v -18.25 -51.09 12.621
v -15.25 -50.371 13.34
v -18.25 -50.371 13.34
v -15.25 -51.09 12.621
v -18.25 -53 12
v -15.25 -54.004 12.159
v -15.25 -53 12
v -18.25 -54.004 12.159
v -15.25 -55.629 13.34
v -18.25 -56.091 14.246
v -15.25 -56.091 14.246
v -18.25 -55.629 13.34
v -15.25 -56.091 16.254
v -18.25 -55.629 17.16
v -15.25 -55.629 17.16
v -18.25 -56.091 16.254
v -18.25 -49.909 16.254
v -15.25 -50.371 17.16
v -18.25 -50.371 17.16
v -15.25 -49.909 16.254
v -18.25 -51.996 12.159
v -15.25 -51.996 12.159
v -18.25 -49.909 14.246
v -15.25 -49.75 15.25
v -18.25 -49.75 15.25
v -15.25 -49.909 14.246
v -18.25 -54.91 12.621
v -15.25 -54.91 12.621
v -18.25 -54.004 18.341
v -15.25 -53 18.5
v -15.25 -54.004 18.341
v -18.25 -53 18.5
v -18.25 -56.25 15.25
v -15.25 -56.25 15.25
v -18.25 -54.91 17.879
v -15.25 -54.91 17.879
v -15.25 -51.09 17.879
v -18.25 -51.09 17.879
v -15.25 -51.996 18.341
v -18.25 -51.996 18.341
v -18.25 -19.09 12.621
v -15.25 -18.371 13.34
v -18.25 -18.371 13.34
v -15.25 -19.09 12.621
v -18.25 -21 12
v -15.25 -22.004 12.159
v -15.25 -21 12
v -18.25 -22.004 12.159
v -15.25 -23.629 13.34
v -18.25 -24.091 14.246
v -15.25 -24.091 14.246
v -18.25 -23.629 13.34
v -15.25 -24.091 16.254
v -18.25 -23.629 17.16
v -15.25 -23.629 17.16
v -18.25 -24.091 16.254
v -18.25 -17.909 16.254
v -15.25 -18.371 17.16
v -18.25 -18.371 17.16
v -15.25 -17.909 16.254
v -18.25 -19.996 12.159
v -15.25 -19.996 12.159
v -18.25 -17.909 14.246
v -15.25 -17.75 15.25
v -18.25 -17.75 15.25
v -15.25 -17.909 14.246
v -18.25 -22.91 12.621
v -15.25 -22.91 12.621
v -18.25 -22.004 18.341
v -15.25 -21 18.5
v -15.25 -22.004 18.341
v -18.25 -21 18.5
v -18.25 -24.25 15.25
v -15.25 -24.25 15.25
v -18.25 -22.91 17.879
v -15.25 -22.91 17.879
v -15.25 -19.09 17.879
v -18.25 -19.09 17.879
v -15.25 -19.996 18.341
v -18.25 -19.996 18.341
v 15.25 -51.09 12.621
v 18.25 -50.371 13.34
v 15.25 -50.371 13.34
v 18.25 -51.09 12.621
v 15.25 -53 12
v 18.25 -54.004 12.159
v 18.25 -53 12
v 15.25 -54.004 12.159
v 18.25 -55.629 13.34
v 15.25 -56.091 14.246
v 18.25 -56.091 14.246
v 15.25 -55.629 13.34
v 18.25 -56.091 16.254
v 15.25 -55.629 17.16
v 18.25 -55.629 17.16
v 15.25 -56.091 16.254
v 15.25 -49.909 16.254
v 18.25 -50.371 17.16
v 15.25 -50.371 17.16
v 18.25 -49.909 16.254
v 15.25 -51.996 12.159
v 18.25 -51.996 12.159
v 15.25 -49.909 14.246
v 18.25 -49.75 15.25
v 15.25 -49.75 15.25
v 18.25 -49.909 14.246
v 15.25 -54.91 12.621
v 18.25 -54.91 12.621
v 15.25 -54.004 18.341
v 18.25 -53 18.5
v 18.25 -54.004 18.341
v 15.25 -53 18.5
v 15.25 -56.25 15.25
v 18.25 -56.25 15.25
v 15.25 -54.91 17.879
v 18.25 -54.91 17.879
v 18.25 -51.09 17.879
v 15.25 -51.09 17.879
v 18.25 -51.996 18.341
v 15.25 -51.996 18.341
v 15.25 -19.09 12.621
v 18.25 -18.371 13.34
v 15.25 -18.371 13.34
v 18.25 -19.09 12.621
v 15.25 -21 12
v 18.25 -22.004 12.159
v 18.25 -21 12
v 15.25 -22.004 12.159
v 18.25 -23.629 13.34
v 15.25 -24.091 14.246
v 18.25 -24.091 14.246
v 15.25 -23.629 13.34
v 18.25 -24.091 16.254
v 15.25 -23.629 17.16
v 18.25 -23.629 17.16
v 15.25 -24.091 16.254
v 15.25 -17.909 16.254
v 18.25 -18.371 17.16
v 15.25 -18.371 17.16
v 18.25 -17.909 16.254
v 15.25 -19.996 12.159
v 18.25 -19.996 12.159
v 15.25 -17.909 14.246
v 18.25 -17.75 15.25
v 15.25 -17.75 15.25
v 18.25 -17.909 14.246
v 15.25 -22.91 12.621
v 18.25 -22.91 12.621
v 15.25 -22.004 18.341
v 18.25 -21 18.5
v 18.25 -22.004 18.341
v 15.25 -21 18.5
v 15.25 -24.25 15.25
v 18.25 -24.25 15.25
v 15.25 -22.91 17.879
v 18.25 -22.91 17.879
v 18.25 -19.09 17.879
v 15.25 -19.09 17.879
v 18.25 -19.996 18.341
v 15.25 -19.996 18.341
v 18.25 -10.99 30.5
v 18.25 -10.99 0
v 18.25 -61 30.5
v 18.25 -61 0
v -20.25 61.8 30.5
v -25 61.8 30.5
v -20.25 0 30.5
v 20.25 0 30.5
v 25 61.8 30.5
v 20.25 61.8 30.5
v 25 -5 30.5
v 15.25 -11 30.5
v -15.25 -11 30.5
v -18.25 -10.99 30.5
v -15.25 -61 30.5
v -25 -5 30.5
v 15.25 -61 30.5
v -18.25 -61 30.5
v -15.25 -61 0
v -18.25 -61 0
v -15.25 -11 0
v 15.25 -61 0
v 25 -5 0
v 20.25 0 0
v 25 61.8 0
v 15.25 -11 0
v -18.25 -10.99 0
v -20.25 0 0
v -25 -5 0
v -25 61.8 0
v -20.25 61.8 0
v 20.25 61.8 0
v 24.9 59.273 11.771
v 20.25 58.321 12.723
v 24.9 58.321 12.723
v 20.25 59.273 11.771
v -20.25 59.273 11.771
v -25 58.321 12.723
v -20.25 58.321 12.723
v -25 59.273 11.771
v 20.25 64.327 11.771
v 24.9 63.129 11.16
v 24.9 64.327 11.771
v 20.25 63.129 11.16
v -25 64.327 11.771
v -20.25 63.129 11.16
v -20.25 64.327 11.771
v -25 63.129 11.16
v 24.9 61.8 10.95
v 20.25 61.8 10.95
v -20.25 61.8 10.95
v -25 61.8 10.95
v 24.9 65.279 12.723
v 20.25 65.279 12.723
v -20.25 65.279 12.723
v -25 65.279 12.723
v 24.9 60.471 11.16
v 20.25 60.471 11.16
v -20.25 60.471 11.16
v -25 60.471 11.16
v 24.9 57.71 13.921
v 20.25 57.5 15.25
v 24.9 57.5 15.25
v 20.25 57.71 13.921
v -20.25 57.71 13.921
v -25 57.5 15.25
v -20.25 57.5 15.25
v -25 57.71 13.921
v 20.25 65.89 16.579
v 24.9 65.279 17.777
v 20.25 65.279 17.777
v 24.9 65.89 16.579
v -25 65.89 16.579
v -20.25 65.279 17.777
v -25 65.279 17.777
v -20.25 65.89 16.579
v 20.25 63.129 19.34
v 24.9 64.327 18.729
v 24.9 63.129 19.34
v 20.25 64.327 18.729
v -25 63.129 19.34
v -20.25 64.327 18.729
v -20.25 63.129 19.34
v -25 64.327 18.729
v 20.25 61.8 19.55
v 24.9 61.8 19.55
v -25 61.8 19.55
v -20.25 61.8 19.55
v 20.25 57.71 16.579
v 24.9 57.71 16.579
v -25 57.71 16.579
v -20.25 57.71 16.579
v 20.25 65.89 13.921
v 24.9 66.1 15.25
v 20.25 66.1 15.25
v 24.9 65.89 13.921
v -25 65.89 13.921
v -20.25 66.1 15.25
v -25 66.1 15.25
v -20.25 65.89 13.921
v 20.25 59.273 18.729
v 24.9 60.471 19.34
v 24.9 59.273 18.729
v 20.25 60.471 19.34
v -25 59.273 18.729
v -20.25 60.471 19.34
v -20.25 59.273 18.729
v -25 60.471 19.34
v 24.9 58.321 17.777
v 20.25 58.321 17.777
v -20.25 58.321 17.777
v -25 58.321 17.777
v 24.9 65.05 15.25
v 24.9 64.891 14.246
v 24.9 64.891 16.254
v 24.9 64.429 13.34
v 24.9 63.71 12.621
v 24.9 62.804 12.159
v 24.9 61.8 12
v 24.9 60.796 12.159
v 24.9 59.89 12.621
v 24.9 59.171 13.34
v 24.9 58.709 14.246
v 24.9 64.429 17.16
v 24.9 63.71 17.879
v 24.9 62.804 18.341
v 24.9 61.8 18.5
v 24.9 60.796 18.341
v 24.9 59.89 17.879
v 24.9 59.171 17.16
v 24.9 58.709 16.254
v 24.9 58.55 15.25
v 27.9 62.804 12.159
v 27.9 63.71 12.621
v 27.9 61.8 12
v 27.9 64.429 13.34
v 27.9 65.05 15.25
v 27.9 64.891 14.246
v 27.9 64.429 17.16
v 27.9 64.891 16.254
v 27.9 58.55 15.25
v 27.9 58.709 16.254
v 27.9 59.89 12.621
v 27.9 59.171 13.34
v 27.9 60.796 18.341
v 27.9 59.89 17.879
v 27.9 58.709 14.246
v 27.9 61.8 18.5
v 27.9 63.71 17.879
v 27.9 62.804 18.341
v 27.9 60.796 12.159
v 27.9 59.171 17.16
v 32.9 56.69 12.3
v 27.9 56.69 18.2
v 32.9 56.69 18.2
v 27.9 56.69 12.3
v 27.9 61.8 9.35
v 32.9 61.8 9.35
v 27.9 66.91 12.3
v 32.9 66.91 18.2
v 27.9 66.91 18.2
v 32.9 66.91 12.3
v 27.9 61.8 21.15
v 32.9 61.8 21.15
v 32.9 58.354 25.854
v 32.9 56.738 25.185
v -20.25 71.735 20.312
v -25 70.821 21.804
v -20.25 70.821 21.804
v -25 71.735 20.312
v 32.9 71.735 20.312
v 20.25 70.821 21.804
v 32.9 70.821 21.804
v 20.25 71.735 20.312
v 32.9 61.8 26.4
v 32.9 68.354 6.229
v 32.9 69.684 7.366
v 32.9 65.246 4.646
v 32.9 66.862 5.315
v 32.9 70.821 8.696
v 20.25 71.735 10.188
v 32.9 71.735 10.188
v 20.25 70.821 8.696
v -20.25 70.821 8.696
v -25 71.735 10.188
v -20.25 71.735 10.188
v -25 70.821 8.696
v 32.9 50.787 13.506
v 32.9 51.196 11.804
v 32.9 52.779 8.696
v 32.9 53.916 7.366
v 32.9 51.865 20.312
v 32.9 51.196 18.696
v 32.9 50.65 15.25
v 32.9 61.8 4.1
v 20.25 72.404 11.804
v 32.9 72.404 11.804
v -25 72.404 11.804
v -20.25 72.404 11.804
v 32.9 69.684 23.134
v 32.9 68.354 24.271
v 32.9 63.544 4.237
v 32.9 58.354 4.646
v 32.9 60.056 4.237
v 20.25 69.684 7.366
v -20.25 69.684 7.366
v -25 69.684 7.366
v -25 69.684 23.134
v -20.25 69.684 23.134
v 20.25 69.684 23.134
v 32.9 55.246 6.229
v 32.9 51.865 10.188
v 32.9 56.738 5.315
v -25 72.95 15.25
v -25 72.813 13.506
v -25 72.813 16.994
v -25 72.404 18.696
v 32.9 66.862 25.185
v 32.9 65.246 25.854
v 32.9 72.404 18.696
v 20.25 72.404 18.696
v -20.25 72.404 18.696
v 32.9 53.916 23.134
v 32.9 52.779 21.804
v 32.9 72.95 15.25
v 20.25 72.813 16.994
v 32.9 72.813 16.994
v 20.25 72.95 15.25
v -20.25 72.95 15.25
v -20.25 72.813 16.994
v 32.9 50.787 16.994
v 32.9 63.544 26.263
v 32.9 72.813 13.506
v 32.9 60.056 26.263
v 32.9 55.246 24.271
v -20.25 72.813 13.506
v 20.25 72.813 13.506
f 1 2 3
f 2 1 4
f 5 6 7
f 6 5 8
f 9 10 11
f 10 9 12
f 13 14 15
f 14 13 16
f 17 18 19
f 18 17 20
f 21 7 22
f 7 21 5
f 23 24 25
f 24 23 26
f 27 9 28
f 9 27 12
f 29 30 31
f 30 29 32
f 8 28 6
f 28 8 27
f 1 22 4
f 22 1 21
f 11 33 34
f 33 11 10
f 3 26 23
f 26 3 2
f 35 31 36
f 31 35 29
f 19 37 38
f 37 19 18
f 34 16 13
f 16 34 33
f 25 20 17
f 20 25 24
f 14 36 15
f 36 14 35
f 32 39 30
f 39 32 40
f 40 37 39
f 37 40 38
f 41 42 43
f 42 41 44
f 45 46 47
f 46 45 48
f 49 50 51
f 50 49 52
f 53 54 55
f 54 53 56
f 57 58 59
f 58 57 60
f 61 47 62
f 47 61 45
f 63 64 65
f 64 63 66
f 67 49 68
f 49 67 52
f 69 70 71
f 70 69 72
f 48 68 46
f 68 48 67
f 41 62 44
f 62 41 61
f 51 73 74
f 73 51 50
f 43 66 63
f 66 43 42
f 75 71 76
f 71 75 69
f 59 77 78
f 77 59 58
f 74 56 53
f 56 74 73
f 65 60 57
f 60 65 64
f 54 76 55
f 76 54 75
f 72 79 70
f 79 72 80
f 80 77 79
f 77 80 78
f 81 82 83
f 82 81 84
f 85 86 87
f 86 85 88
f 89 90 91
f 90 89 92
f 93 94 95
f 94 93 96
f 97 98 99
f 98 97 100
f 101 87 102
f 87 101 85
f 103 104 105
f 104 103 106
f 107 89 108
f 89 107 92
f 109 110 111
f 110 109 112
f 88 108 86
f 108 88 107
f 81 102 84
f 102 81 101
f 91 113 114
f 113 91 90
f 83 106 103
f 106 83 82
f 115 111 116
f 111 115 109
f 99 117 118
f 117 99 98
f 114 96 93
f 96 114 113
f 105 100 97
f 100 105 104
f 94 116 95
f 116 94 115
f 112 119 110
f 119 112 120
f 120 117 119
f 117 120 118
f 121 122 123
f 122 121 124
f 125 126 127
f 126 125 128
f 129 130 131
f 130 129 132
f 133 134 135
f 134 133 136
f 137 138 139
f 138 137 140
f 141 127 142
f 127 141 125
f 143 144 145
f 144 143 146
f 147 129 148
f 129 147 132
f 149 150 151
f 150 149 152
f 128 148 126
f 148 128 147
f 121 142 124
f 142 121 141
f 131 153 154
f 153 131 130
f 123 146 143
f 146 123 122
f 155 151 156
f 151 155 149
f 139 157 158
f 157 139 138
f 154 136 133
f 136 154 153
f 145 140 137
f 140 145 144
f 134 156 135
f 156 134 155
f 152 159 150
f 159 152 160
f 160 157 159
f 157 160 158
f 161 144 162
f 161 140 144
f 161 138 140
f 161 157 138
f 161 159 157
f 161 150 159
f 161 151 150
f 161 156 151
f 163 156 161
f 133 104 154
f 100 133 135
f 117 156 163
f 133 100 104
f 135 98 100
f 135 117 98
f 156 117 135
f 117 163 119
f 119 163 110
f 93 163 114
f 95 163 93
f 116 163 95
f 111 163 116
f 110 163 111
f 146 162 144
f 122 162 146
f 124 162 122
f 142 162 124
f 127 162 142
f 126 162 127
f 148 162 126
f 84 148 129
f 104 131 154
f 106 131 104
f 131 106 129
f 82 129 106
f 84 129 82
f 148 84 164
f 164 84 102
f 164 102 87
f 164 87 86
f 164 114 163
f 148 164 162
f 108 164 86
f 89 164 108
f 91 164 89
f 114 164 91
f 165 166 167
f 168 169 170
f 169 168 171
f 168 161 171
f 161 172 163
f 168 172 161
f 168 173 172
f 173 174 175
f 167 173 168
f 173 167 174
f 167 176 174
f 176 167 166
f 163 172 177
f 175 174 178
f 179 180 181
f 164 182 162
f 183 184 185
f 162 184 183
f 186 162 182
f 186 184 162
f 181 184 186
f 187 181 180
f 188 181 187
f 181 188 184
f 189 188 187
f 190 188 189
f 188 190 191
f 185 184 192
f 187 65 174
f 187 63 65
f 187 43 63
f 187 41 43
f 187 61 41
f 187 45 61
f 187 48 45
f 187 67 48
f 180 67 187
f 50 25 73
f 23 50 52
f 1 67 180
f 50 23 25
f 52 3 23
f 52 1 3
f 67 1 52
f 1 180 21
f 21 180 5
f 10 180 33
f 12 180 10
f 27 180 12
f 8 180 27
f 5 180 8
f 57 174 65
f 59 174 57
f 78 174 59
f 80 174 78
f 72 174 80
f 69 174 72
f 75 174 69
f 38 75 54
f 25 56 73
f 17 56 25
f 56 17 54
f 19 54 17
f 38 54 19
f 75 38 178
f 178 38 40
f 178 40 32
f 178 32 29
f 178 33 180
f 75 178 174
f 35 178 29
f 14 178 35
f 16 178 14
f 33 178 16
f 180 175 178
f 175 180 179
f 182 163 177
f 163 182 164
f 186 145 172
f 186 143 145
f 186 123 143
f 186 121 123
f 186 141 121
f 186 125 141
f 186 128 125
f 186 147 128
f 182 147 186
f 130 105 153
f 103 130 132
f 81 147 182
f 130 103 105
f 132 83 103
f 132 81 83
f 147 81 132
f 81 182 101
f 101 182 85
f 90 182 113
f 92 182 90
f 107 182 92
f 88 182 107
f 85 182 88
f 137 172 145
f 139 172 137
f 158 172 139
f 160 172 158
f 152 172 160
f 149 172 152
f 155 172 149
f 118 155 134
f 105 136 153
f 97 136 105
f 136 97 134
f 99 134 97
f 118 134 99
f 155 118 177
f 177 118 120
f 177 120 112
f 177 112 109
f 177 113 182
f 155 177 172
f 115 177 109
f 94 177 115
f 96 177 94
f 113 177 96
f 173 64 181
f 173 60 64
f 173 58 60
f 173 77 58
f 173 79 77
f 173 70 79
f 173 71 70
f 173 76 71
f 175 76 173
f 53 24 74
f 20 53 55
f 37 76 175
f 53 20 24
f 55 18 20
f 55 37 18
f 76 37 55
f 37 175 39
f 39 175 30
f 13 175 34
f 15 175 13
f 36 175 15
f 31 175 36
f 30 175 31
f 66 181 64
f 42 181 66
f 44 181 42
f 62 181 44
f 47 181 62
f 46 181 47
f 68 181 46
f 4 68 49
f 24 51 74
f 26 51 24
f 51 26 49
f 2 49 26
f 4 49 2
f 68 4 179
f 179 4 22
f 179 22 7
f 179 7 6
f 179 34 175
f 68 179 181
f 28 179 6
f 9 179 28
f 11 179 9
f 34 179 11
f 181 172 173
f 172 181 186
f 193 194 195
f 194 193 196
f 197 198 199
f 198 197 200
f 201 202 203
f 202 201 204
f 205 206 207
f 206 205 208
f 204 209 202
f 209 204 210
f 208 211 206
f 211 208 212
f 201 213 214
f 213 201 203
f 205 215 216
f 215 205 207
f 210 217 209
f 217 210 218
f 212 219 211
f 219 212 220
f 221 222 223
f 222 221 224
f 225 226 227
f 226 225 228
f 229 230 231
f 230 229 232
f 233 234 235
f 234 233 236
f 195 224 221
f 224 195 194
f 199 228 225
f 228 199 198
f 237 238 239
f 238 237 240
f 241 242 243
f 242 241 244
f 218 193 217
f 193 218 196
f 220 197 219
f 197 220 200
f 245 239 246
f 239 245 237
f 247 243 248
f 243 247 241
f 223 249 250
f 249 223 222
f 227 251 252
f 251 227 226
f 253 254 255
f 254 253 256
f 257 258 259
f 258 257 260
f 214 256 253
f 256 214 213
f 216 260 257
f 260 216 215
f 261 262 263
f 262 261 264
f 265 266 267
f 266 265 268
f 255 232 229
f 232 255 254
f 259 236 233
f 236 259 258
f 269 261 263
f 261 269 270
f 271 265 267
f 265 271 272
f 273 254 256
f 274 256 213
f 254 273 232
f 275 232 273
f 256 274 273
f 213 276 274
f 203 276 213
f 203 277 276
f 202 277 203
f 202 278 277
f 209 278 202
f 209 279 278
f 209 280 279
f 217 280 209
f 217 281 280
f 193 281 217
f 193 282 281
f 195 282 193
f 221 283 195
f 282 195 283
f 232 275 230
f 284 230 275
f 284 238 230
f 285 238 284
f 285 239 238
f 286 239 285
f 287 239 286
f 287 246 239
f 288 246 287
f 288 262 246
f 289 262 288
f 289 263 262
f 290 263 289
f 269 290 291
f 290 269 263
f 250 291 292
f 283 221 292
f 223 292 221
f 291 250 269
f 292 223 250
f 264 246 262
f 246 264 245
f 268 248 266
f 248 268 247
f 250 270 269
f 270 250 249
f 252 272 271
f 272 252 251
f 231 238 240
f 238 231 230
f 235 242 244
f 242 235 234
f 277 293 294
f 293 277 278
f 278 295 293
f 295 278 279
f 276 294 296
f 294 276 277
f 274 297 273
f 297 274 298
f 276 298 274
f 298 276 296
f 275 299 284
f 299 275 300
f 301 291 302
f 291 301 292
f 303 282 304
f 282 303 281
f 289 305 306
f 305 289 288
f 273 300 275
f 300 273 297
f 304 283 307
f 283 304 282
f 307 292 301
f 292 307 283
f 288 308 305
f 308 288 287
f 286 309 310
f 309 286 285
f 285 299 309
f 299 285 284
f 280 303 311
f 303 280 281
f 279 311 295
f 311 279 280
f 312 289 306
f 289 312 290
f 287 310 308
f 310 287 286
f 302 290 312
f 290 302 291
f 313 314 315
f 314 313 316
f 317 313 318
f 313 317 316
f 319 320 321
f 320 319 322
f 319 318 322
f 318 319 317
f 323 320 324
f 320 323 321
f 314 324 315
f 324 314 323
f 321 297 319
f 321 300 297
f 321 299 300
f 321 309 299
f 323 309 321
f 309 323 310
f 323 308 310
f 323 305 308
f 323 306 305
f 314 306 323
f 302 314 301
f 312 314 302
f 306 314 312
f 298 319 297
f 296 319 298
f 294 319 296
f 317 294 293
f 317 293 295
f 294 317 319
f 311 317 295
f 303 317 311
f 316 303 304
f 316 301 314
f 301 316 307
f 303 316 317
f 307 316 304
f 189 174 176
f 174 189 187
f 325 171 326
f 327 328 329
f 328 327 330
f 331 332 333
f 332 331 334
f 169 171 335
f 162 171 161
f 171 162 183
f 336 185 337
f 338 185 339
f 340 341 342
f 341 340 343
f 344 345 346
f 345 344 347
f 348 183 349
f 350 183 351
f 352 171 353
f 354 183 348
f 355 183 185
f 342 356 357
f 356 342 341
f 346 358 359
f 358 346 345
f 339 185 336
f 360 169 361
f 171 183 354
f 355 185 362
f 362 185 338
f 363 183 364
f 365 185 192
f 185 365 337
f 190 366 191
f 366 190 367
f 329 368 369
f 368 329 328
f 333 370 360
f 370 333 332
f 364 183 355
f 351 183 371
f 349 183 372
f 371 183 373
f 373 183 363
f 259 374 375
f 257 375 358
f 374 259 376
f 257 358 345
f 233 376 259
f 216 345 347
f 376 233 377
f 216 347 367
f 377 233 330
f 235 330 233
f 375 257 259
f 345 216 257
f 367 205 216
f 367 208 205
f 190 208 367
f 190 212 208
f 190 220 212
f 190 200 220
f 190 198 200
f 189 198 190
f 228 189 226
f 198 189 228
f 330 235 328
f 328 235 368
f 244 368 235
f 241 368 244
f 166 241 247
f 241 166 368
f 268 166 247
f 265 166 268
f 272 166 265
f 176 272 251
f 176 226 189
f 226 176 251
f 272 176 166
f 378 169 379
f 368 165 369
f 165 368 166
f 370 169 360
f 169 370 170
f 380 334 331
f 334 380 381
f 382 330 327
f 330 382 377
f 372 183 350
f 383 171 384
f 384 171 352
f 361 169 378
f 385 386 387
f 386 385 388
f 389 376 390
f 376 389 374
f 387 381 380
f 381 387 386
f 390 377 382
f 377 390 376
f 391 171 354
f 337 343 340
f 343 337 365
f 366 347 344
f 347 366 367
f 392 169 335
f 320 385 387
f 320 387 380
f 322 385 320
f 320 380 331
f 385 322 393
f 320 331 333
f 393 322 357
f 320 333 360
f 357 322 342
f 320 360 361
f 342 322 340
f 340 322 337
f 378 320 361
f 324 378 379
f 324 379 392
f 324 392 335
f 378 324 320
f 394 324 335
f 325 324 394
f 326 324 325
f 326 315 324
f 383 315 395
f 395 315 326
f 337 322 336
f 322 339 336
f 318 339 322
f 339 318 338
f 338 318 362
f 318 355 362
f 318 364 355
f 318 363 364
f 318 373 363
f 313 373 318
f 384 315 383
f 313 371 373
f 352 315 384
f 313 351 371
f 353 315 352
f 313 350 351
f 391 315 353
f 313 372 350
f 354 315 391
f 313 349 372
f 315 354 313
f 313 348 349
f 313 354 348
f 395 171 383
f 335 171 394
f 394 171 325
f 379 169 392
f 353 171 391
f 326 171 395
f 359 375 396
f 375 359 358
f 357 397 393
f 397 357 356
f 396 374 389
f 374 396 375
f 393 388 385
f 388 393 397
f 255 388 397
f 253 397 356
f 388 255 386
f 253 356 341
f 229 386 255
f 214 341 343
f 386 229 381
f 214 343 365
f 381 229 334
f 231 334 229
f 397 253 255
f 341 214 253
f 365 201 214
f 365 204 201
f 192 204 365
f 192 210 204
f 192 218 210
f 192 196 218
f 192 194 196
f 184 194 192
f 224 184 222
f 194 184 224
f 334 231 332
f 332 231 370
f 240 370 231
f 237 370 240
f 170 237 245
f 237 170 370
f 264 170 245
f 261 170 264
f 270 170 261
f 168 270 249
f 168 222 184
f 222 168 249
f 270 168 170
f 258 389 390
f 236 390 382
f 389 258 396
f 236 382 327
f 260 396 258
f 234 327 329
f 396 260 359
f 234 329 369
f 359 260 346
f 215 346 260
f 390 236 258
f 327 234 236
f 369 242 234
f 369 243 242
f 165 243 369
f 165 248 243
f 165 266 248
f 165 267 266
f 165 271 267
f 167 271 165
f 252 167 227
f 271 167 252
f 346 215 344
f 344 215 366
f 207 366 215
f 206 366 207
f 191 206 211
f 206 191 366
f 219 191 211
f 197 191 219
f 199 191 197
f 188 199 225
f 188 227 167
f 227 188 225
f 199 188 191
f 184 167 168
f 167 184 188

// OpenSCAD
// file: ../src/lib/ALU_profile_holder_top.scad
include <../../parameters.scad>



module ALU_profile_holder_top(deep=35) {
    wall_thickness = ALU_profile_holder_wall_thickness;
    
    module screw_holes() {
        translate([wall_thickness/2, 8, ALU_profile_width/2]) {
            rotate([0, 90, 0]) 
                cylinder(d=M6_screw_diameter, h=wall_thickness*2, center=true, $fn=20);
        }
        translate([wall_thickness/2, deep-10, ALU_profile_width/2]) {
                rotate([0, 90, 0])
                cylinder(d=M6_screw_diameter, h=wall_thickness*2, center=true, $fn=20);
            
        }
    }
    
    difference() {
        cube([ALU_profile_width+wall_thickness*2, deep+wall_thickness*2, ALU_profile_width]);
        translate([wall_thickness, -0.1, -0.1])
            cube([ALU_profile_width, deep+0.1, ALU_profile_width+0.2]);
        
        screw_holes();
        translate([ALU_profile_width+wall_thickness, 0, 0])
            screw_holes();
    }
}

ALU_profile_holder_top(35);
// file: ../src/888_5004.scad
include <../parameters.scad>
use <./lib/ALU_profile_holder_top.scad>


height = ALU_profile_width+608_bearing_outer_diameter-2+ALU_profile_holder_wall_thickness*2+5;


module 888_5004_hinge_attachment() {
    translate([-(50)/2, height, ALU_profile_width/2])
    rotate([0, 90, 0])
    cylinder(h=50, d=8);
    
    
    translate([-(ALU_profile_width+ALU_profile_holder_wall_thickness*2)/2, height-10, ALU_profile_width/2-10])
    cube([ALU_profile_width+ALU_profile_holder_wall_thickness*2, 20, 20]);
}

module 888_5004() {

    translate([-ALU_profile_width/2-ALU_profile_holder_wall_thickness, -55-ALU_profile_holder_wall_thickness*2, 0])
        ALU_profile_holder_top(50);

    difference() {
        hull() {
            translate([-50/2, -5, 0])
            cube([50, height+5, ALU_profile_width]);

            translate([ALU_profile_width/-2-ALU_profile_holder_wall_thickness, -ALU_profile_holder_wall_thickness*2-5+.01, 0])
            cube([ALU_profile_width+ALU_profile_holder_wall_thickness*2, ALU_profile_holder_wall_thickness*2, ALU_profile_width]);

            translate([(3+M6_nut_height)/2, height, ALU_profile_width/2])
            rotate([0, 90, 0])
            cylinder(d=608_bearing_outer_diameter, h=50+3+M6_nut_height, center=true, $fn=40);
        }

        translate([-(ALU_profile_width+ALU_profile_holder_wall_thickness*2+4)/2, 0, -0.1])
        cube([ALU_profile_width+ALU_profile_holder_wall_thickness*2+4, height+608_bearing_outer_diameter/2, ALU_profile_width+0.2]);

        translate([-50/2-0.1, height, ALU_profile_width/2])
        rotate([0, 90, 0])
        union() {
            cylinder(d=M8_screw_diameter, h=50, $fn=20);
            cylinder(d=M6_screw_diameter, h=70, $fn=20);
            
            translate([0, 0, 50+3])
            cylinder(d=M6_nut_diameter, h=70, $fn=6);
        }
    }
}

888_5004();

#888_5004_hinge_attachment();
// file: ../parameters.scad
maximum_printable_size = 150;

layer_thickness = 0.3;
global_clearance = 0.5;


//Screw diameter and nut for M10 [mm]
M10_screw_diameter = 10.4;
M10_head_height = 10;
M10_head_diameter = 16+0.5;
M10_nut_height = 10.5;
M10_nut_diameter = 25.5;
M10_nut_pocket = 22.3;

//Screw diameter for M8 [mm]
M8_screw_diameter = 8.6;
M8_head_height = 8;
M8_head_diameter = 13.5;
M8_nut_height = 7.5;
M8_square_nut_thin_height = 4.5;
M8_nut_diameter = 14.4 + 0.5;
M8_nut_pocket = 13 + 0.5;
M8_washer_diameter = 16;
M8_washer_thickness = 1.5;


//Screw diameter and nut for M6 [mm]
M6_screw_diameter=6.5;
M6_head_diameter = 10+0.5;
M6_head_height = 6;
M6_nut_height = 4.9;
M6_nut_diameter = 11.8;
M6_nut_pocket = 10.4;
M6_square_nut_height = 3;
M6_square_nut_diameter = 10;
M6_washer_thickness = 1.6;

//Screw diameter and nut for M5 [mm]
M5_screw_diameter=5.5;
M5_head_height = 5;
M5_head_diameter = 13+0.5;
M5_nut_height = 4.5;
M5_nut_diameter = 9.4;
M5_nut_pocket = 8.4;

//Screw diameter and nut for M4 [mm]
M4_screw_diameter=4.5;
M4_screw_head_height = 4;
M4_nut_height = 3.2;
M4_nut_diameter = 8.4;
M4_nut_pocket = 7.5;

//Screw diameter and nut for M3 [mm]
M3_screw_diameter = 3.2;
M3_nut_height = 2.7;
M3_nut_diameter = 6.6;
M3_nut_pocket = 5.6;
M3_screw_head_height = 3;

//Screw diameter and nut for M2,5 [mm]
M2_5_screw_diameter = 2.7;
M2_5_nut_height = 2.3;
M2_5_nut_diameter = 6;
M2_5_nut_pocket = 5.5;

// kulove lozisko

bearing_efsm_08_h = 33+1;
bearing_efsm_08_m = 22;
bearing_efsm_08_db = 18;
bearing_efsm_08_ag = 10.5;
bearing_efsm_08_n = M4_screw_diameter;
bearing_efsm_08_a1 = 5.5;
bearing_efsm_08_d = 8.25;
bearing_efsm_08_B = 8; // ball height

bearing_efsm_10_h = 38+1;
bearing_efsm_10_m = 26;
bearing_efsm_10_db = 21.9;
bearing_efsm_10_ag = 12+0.2;
bearing_efsm_10_n = M5_screw_diameter;
bearing_efsm_10_a1 = 6.5;
bearing_efsm_10_d = 10.25;


bearing_efsm_12_width = 40+1;
bearing_efsm_12_h = bearing_efsm_12_width;
bearing_efsm_12_boltd = 28/2; // polovina vzdalenosti mezi srouby
bearing_efsm_12_m = bearing_efsm_12_boltd*2;
bearing_efsm_12_db = 25;
bearing_efsm_12_ag = 13;
bearing_efsm_12_a1 = 7;
bearing_efsm_12_n = M5_screw_diameter;
bearing_efsm_12_d = 12.15;
bearing_efsm_12_B = 10; // ball height
bearing_efsm_space = 1;

bearing_efsm_17_width = 54+1;
bearing_efsm_17_h = bearing_efsm_17_width;
bearing_efsm_17_boltd = 38/2; // polovina vzdalenosti mezi srouby
bearing_efsm_17_m = bearing_efsm_17_boltd*2;
bearing_efsm_17_db = 35;
bearing_efsm_17_ag = 18;
bearing_efsm_17_n = M6_screw_diameter;
bearing_efsm_17_a1 = 10;
bearing_efsm_17_B = 17; // ball height

//limcove lozisko
bearing_EFOM_10_L=26; //celkova sirka zakladny
bearing_EFOM_10_d1=10.3;//diametr otvoru real=10 mm
bearing_EFOM_10_dB=22;//diametr vystupku pro ulozeni lozika
bearing_EFOM_10_H=52;//celková delka zakladny
bearing_EFOM_10_J=36;// hole pitch
bearing_EFOM_10_A1=6.5;//vyska pouzdra
bearing_EFOM_10_Ag=12;//celkova vyska
bearing_EFOM_10_N1=5;//sirka otvoru pro sroub
bearing_EFOM_10_N2=8;//delka otvoru pro sroub
bearing_EFOM_10_m=36;//roztec der pro sroub
bearing_EFOM_10_h=9;//vyska lozika


608_bearing_outer_diameter = 22.3;
608_bearing_inner_diameter = 16;
608_bearing_thickness = 7.1;


// 20 KG servo parameters

servo_20kg_axis_offset = 9.375; // jak je osa mimo stredu
servo_20kg_body_x = 42;
servo_20kg_body_y = 21;
servo_20kg_body_z = 40;
servo_20kg_thread_x = 49/2;
servo_20kg_thread_y = 10/2;
servo_20kg_body_below = 10; // jak hluboko je tělo serva pod drzaky na srouby
servo_20kg_below = 25.8; // jak hluboko je páka serva pod drzaky na srouby

servo_20kg_bolt_d = 2.5+0.3;
servo_20kg_nut_d = 5+0.3;


//strain gauge
strain_gauge_width = 12.7;
strain_gauge_length = 75.1;
strain_gauge_screw_distance = 10;

//ALU profile
ALU_profile_width = 30.5;
ALU_profile_holder_wall_thickness = 3;
ALU_profile_groove_width = 8;

//pillow block bearing
//https://www.igus.eu/product/372
//Part no. KSTM-08
KSTM08_screws_distance = 33;         //m
KSTM08_screws_holes_diameter = 4.5;  //d2
KSTM08_flange_thickness = 6;         //h3
KSTM08_case_width = 9;               //C1
KSTM08_case_length = 47;             //a
KSTM08_ball_width = 12;              //B
KSTM08_ball_hole_diameter = 7.85;    //d1


//ložiska pro malý rotor
bearing_outer_diameter = 10.2;    // Rozměr B1 v nákresu s přídavkem na toleranci otvoru
bearing_thickness = 4;        // Rozměr B2 v nákresu
//bearing_shaft_length = 19.5;    // Rozměr B3 v nákresu, Originalni hodnota 19.5
bearing_shaft_length = 20;    // Rozměr B3 v nákresu


//parametry víčka s telemetrickou anténou
S01_sila_materialu=1.2;
S01_vyska_horni_zavit=10;
S01_hloubka_zavitu=4;
S01_prumer_vnitrni=50;
LO_spodni_prumer=17.2;
LO_vyska_bez_krytu=15;
S01_tolerance_zavit=1.5;
R01_vyska_prekryti_statoru=10;

g3_0_cone1 = 70;
g3_0_srcew_dist = 55;



// scale parameters
base_length = 500;
mid_base_width = 500;
mid_base_height = 200;
mid_base_length = 500;
mid_base_x_offset = 50;
base_mid_base_hinge_offset = 50;
tower_height = 185;
tower_angle = atan((mid_base_width/2-ALU_profile_width-10)/tower_height);
tower_arm_length = tower_height/cos(tower_angle);
tower_drag_z_offset = 22;
electro_box_length = 225;
electro_box_width = 165;
electro_box_height = 51.5;

// calibration device parameters
calibration_arm_x_offset = 140;
calibration_arm_y_offset = 50;

// rotor paramters
rotor_blades_count = 2;
rotor_delta_angle = 12;
blade_mount_screw = M3_screw_diameter;
blade_mount_nut = M3_nut_diameter;
// main file
//@set_slicing_config(../slicing/default.ini)

include <../parameters.scad>
use <../src/888_5004.scad>

888_5004();
